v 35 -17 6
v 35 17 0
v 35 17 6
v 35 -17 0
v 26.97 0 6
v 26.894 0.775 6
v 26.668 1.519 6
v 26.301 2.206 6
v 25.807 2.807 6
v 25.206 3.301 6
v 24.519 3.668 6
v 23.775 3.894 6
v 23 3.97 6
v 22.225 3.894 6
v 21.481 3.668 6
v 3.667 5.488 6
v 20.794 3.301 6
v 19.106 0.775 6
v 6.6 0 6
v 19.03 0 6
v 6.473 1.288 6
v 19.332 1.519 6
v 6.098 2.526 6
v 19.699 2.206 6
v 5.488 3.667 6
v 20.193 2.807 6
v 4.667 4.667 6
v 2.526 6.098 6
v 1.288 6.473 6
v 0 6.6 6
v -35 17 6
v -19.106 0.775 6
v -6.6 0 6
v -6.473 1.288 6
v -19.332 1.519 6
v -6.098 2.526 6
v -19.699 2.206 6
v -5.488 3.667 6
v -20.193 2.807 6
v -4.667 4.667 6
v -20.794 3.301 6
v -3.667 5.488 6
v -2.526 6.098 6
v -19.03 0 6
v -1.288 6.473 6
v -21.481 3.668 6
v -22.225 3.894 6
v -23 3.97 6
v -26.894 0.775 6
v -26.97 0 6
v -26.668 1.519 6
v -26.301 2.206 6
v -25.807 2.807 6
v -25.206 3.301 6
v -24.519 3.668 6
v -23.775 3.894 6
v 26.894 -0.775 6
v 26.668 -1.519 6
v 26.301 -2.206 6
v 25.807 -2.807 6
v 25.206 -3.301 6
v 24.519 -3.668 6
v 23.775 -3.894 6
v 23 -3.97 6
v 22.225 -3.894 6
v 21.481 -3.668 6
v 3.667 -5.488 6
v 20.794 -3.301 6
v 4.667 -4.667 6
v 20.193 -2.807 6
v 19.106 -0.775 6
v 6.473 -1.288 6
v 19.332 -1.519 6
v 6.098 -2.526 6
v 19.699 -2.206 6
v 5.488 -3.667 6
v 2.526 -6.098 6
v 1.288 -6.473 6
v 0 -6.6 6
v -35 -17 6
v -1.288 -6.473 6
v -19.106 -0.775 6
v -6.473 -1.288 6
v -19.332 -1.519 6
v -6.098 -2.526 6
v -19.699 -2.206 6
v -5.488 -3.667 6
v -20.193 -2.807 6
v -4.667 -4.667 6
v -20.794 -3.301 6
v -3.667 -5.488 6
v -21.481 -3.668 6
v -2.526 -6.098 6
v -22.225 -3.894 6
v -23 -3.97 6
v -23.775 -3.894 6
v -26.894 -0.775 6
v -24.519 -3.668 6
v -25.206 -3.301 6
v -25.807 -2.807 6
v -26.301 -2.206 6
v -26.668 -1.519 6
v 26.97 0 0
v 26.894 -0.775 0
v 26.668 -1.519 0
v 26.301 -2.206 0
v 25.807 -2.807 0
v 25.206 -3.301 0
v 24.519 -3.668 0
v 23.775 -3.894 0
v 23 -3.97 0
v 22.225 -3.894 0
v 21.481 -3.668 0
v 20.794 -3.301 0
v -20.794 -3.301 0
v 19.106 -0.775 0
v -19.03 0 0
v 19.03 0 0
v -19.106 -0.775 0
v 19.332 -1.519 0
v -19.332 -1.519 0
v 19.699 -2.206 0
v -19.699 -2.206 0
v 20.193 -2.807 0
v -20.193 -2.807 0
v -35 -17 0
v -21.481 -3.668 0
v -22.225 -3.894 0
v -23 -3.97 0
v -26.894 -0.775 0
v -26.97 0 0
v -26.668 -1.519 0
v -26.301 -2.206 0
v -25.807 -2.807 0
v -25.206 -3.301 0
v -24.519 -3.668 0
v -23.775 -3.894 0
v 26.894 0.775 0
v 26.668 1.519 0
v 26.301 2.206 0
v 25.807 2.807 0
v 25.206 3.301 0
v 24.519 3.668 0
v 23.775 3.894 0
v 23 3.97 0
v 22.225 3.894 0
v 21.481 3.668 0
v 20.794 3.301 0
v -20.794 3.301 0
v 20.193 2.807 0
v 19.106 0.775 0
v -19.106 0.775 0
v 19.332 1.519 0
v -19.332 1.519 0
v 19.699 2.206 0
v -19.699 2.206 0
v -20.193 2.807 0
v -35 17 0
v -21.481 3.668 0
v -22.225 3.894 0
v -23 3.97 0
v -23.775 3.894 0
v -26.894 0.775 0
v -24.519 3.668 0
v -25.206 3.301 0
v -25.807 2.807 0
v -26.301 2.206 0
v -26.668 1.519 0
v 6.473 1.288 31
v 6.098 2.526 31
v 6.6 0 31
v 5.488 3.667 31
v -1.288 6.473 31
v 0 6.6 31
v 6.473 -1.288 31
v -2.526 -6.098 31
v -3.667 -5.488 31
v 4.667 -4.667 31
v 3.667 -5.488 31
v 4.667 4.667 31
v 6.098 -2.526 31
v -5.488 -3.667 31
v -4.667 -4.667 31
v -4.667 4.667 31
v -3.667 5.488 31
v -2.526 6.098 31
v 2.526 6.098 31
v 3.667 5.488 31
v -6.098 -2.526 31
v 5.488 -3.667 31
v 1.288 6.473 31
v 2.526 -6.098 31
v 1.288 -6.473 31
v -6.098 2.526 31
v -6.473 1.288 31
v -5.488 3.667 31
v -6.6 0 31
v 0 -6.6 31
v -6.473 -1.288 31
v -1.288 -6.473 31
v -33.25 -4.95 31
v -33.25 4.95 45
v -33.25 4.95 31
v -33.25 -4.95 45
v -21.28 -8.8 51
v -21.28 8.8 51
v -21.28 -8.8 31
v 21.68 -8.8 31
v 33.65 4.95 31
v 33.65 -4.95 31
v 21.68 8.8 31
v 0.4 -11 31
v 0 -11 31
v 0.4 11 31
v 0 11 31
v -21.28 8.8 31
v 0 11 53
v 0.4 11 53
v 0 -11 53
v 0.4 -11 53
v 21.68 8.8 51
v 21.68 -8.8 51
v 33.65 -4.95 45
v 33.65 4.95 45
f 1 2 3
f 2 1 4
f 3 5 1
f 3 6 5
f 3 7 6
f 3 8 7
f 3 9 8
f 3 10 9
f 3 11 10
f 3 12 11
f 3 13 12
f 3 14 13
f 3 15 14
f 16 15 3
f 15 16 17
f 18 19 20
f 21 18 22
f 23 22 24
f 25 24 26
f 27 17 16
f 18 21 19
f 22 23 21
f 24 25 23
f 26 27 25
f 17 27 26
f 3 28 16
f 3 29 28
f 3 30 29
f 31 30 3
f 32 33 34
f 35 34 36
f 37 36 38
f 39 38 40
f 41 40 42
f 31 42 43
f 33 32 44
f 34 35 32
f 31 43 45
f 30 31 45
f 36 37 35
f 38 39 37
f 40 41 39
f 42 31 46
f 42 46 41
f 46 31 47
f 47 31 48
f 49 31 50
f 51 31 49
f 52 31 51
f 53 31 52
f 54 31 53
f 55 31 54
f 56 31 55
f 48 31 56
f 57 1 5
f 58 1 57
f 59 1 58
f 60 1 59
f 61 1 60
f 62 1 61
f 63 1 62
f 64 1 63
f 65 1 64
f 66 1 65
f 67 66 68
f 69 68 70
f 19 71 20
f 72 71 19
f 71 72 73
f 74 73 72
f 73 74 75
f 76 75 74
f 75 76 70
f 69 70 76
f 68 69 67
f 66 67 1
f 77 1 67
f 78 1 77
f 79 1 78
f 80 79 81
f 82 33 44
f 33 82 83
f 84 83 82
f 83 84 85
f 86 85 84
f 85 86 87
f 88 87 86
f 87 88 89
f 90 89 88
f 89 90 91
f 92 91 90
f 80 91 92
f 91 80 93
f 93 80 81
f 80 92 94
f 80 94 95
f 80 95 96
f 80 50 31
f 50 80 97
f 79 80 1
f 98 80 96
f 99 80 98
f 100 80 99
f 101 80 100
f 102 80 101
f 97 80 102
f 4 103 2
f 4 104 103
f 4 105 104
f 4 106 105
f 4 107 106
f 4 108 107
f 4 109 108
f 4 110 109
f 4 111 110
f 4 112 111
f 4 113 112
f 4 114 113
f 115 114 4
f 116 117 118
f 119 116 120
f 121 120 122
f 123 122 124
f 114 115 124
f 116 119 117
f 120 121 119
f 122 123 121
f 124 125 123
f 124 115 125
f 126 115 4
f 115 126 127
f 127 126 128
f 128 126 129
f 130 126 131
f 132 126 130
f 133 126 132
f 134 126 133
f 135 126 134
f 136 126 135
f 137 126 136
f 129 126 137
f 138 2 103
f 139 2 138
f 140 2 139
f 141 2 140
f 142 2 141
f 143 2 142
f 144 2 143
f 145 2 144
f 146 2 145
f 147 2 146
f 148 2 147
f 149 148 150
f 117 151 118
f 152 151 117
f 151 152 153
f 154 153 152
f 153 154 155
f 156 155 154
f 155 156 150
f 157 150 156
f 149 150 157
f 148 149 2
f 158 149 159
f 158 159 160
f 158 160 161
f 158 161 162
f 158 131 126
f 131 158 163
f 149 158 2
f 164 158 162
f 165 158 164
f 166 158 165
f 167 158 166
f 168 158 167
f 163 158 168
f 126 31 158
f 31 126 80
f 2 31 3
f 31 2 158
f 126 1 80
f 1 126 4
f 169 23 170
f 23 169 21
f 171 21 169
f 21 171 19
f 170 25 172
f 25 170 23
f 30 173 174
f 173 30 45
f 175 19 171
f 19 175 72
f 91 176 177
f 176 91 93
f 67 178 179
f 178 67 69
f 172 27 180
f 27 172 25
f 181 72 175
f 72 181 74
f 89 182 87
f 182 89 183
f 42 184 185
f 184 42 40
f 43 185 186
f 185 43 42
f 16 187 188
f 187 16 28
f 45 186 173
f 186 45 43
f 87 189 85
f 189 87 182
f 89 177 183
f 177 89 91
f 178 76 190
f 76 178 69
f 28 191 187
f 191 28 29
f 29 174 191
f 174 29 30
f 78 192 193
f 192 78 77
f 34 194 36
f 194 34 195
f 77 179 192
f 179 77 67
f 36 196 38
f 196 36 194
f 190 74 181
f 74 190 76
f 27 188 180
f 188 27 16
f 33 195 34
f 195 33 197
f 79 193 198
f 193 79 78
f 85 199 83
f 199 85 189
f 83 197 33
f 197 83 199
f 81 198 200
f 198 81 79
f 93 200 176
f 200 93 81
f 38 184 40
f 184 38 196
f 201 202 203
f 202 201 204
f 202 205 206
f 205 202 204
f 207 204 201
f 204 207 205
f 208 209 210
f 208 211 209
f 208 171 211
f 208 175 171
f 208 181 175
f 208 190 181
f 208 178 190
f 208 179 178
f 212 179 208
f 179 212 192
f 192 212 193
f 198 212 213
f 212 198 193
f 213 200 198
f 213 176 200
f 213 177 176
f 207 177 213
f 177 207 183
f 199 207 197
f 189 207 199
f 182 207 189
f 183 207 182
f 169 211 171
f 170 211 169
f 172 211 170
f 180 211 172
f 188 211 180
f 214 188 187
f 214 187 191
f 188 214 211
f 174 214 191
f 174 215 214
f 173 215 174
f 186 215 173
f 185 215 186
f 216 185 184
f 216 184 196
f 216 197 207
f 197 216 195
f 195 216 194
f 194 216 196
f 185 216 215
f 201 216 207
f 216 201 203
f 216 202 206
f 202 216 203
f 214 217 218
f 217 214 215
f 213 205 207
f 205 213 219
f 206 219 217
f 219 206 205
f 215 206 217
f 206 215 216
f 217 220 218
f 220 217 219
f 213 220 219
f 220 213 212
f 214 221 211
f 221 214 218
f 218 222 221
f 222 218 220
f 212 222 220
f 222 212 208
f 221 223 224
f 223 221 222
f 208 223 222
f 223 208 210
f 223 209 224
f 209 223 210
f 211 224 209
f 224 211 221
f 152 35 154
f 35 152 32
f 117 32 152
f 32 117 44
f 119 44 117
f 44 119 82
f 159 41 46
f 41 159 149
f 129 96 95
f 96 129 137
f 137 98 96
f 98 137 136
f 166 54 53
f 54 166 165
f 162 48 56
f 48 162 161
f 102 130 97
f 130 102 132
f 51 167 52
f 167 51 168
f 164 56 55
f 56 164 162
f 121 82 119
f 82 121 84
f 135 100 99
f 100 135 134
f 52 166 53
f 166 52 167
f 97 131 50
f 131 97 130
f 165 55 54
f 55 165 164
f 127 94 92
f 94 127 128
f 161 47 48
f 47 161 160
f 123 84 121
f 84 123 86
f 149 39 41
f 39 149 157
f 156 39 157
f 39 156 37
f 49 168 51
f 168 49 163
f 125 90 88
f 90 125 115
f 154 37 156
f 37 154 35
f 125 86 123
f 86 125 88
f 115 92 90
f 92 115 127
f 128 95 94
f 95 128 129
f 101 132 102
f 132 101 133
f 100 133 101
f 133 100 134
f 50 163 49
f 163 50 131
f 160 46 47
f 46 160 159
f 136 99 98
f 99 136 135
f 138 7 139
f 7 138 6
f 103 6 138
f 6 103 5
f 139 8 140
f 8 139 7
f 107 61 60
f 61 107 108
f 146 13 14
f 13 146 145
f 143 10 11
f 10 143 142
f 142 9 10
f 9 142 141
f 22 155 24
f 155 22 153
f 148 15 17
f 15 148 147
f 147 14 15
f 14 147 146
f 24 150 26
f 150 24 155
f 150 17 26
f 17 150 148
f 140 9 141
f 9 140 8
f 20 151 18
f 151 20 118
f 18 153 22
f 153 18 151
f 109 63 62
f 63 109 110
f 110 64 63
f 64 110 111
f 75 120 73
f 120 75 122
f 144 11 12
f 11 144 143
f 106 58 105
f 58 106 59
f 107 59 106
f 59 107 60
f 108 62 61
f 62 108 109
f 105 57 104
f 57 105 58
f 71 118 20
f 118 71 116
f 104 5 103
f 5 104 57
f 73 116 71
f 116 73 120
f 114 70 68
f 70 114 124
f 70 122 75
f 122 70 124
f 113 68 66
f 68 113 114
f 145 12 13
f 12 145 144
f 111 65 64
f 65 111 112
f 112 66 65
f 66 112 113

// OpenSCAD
$fn = 32;

// ----------------------------------------------------------------------
// Boat cleat: 70 mm base, horn 42 mm up
// ----------------------------------------------------------------------

// --- parameters (mm) ---
base_l = 70;              // base length
base_w = 34;              // base width
base_t = 6;               // base thickness
horn_len = 66.5;          // horn length
horn_d = 22;              // horn diameter at the middle
horn_z = 42;              // horn axis height
end_drop = 8;             // how far the horn tips drop
post_d = 13.2;            // centre post diameter
holes_d = 7.94;           // fixing holes
hole_x = 23;              // fixing hole spacing

difference() {
  union() {
    translate([-35, -17, 0]) cube([base_l, base_w, base_t]);
    /* centre post, sunk 1 mm into the base */
    translate([0, 0, 5]) cylinder(h = 37, d = post_d);
    /* horn: a hull chain of boxes, full in the middle and lighter at the tips */
    hull() {
      translate([-33.25, -4.95, 31]) cube([0.4, 9.9, 14], center = false);
      translate([-21.28, -8.8, 31]) cube([0.4, 17.6, 20], center = false);
    }
    hull() {
      translate([-21.28, -8.8, 31]) cube([0.4, 17.6, 20], center = false);
      translate([0, -11, 31]) cube([0.4, 22, 22], center = false);
    }
    hull() {
      translate([0, -11, 31]) cube([0.4, 22, 22], center = false);
      translate([21.28, -8.8, 31]) cube([0.4, 17.6, 20], center = false);
    }
    hull() {
      translate([21.28, -8.8, 31]) cube([0.4, 17.6, 20], center = false);
      translate([33.25, -4.95, 31]) cube([0.4, 9.9, 14], center = false);
    }
  }
  translate([-23, 0, -2.5]) cylinder(h = base_t + 5, d = holes_d);
  translate([23, 0, -2.5]) cylinder(h = base_t + 5, d = holes_d);
}
